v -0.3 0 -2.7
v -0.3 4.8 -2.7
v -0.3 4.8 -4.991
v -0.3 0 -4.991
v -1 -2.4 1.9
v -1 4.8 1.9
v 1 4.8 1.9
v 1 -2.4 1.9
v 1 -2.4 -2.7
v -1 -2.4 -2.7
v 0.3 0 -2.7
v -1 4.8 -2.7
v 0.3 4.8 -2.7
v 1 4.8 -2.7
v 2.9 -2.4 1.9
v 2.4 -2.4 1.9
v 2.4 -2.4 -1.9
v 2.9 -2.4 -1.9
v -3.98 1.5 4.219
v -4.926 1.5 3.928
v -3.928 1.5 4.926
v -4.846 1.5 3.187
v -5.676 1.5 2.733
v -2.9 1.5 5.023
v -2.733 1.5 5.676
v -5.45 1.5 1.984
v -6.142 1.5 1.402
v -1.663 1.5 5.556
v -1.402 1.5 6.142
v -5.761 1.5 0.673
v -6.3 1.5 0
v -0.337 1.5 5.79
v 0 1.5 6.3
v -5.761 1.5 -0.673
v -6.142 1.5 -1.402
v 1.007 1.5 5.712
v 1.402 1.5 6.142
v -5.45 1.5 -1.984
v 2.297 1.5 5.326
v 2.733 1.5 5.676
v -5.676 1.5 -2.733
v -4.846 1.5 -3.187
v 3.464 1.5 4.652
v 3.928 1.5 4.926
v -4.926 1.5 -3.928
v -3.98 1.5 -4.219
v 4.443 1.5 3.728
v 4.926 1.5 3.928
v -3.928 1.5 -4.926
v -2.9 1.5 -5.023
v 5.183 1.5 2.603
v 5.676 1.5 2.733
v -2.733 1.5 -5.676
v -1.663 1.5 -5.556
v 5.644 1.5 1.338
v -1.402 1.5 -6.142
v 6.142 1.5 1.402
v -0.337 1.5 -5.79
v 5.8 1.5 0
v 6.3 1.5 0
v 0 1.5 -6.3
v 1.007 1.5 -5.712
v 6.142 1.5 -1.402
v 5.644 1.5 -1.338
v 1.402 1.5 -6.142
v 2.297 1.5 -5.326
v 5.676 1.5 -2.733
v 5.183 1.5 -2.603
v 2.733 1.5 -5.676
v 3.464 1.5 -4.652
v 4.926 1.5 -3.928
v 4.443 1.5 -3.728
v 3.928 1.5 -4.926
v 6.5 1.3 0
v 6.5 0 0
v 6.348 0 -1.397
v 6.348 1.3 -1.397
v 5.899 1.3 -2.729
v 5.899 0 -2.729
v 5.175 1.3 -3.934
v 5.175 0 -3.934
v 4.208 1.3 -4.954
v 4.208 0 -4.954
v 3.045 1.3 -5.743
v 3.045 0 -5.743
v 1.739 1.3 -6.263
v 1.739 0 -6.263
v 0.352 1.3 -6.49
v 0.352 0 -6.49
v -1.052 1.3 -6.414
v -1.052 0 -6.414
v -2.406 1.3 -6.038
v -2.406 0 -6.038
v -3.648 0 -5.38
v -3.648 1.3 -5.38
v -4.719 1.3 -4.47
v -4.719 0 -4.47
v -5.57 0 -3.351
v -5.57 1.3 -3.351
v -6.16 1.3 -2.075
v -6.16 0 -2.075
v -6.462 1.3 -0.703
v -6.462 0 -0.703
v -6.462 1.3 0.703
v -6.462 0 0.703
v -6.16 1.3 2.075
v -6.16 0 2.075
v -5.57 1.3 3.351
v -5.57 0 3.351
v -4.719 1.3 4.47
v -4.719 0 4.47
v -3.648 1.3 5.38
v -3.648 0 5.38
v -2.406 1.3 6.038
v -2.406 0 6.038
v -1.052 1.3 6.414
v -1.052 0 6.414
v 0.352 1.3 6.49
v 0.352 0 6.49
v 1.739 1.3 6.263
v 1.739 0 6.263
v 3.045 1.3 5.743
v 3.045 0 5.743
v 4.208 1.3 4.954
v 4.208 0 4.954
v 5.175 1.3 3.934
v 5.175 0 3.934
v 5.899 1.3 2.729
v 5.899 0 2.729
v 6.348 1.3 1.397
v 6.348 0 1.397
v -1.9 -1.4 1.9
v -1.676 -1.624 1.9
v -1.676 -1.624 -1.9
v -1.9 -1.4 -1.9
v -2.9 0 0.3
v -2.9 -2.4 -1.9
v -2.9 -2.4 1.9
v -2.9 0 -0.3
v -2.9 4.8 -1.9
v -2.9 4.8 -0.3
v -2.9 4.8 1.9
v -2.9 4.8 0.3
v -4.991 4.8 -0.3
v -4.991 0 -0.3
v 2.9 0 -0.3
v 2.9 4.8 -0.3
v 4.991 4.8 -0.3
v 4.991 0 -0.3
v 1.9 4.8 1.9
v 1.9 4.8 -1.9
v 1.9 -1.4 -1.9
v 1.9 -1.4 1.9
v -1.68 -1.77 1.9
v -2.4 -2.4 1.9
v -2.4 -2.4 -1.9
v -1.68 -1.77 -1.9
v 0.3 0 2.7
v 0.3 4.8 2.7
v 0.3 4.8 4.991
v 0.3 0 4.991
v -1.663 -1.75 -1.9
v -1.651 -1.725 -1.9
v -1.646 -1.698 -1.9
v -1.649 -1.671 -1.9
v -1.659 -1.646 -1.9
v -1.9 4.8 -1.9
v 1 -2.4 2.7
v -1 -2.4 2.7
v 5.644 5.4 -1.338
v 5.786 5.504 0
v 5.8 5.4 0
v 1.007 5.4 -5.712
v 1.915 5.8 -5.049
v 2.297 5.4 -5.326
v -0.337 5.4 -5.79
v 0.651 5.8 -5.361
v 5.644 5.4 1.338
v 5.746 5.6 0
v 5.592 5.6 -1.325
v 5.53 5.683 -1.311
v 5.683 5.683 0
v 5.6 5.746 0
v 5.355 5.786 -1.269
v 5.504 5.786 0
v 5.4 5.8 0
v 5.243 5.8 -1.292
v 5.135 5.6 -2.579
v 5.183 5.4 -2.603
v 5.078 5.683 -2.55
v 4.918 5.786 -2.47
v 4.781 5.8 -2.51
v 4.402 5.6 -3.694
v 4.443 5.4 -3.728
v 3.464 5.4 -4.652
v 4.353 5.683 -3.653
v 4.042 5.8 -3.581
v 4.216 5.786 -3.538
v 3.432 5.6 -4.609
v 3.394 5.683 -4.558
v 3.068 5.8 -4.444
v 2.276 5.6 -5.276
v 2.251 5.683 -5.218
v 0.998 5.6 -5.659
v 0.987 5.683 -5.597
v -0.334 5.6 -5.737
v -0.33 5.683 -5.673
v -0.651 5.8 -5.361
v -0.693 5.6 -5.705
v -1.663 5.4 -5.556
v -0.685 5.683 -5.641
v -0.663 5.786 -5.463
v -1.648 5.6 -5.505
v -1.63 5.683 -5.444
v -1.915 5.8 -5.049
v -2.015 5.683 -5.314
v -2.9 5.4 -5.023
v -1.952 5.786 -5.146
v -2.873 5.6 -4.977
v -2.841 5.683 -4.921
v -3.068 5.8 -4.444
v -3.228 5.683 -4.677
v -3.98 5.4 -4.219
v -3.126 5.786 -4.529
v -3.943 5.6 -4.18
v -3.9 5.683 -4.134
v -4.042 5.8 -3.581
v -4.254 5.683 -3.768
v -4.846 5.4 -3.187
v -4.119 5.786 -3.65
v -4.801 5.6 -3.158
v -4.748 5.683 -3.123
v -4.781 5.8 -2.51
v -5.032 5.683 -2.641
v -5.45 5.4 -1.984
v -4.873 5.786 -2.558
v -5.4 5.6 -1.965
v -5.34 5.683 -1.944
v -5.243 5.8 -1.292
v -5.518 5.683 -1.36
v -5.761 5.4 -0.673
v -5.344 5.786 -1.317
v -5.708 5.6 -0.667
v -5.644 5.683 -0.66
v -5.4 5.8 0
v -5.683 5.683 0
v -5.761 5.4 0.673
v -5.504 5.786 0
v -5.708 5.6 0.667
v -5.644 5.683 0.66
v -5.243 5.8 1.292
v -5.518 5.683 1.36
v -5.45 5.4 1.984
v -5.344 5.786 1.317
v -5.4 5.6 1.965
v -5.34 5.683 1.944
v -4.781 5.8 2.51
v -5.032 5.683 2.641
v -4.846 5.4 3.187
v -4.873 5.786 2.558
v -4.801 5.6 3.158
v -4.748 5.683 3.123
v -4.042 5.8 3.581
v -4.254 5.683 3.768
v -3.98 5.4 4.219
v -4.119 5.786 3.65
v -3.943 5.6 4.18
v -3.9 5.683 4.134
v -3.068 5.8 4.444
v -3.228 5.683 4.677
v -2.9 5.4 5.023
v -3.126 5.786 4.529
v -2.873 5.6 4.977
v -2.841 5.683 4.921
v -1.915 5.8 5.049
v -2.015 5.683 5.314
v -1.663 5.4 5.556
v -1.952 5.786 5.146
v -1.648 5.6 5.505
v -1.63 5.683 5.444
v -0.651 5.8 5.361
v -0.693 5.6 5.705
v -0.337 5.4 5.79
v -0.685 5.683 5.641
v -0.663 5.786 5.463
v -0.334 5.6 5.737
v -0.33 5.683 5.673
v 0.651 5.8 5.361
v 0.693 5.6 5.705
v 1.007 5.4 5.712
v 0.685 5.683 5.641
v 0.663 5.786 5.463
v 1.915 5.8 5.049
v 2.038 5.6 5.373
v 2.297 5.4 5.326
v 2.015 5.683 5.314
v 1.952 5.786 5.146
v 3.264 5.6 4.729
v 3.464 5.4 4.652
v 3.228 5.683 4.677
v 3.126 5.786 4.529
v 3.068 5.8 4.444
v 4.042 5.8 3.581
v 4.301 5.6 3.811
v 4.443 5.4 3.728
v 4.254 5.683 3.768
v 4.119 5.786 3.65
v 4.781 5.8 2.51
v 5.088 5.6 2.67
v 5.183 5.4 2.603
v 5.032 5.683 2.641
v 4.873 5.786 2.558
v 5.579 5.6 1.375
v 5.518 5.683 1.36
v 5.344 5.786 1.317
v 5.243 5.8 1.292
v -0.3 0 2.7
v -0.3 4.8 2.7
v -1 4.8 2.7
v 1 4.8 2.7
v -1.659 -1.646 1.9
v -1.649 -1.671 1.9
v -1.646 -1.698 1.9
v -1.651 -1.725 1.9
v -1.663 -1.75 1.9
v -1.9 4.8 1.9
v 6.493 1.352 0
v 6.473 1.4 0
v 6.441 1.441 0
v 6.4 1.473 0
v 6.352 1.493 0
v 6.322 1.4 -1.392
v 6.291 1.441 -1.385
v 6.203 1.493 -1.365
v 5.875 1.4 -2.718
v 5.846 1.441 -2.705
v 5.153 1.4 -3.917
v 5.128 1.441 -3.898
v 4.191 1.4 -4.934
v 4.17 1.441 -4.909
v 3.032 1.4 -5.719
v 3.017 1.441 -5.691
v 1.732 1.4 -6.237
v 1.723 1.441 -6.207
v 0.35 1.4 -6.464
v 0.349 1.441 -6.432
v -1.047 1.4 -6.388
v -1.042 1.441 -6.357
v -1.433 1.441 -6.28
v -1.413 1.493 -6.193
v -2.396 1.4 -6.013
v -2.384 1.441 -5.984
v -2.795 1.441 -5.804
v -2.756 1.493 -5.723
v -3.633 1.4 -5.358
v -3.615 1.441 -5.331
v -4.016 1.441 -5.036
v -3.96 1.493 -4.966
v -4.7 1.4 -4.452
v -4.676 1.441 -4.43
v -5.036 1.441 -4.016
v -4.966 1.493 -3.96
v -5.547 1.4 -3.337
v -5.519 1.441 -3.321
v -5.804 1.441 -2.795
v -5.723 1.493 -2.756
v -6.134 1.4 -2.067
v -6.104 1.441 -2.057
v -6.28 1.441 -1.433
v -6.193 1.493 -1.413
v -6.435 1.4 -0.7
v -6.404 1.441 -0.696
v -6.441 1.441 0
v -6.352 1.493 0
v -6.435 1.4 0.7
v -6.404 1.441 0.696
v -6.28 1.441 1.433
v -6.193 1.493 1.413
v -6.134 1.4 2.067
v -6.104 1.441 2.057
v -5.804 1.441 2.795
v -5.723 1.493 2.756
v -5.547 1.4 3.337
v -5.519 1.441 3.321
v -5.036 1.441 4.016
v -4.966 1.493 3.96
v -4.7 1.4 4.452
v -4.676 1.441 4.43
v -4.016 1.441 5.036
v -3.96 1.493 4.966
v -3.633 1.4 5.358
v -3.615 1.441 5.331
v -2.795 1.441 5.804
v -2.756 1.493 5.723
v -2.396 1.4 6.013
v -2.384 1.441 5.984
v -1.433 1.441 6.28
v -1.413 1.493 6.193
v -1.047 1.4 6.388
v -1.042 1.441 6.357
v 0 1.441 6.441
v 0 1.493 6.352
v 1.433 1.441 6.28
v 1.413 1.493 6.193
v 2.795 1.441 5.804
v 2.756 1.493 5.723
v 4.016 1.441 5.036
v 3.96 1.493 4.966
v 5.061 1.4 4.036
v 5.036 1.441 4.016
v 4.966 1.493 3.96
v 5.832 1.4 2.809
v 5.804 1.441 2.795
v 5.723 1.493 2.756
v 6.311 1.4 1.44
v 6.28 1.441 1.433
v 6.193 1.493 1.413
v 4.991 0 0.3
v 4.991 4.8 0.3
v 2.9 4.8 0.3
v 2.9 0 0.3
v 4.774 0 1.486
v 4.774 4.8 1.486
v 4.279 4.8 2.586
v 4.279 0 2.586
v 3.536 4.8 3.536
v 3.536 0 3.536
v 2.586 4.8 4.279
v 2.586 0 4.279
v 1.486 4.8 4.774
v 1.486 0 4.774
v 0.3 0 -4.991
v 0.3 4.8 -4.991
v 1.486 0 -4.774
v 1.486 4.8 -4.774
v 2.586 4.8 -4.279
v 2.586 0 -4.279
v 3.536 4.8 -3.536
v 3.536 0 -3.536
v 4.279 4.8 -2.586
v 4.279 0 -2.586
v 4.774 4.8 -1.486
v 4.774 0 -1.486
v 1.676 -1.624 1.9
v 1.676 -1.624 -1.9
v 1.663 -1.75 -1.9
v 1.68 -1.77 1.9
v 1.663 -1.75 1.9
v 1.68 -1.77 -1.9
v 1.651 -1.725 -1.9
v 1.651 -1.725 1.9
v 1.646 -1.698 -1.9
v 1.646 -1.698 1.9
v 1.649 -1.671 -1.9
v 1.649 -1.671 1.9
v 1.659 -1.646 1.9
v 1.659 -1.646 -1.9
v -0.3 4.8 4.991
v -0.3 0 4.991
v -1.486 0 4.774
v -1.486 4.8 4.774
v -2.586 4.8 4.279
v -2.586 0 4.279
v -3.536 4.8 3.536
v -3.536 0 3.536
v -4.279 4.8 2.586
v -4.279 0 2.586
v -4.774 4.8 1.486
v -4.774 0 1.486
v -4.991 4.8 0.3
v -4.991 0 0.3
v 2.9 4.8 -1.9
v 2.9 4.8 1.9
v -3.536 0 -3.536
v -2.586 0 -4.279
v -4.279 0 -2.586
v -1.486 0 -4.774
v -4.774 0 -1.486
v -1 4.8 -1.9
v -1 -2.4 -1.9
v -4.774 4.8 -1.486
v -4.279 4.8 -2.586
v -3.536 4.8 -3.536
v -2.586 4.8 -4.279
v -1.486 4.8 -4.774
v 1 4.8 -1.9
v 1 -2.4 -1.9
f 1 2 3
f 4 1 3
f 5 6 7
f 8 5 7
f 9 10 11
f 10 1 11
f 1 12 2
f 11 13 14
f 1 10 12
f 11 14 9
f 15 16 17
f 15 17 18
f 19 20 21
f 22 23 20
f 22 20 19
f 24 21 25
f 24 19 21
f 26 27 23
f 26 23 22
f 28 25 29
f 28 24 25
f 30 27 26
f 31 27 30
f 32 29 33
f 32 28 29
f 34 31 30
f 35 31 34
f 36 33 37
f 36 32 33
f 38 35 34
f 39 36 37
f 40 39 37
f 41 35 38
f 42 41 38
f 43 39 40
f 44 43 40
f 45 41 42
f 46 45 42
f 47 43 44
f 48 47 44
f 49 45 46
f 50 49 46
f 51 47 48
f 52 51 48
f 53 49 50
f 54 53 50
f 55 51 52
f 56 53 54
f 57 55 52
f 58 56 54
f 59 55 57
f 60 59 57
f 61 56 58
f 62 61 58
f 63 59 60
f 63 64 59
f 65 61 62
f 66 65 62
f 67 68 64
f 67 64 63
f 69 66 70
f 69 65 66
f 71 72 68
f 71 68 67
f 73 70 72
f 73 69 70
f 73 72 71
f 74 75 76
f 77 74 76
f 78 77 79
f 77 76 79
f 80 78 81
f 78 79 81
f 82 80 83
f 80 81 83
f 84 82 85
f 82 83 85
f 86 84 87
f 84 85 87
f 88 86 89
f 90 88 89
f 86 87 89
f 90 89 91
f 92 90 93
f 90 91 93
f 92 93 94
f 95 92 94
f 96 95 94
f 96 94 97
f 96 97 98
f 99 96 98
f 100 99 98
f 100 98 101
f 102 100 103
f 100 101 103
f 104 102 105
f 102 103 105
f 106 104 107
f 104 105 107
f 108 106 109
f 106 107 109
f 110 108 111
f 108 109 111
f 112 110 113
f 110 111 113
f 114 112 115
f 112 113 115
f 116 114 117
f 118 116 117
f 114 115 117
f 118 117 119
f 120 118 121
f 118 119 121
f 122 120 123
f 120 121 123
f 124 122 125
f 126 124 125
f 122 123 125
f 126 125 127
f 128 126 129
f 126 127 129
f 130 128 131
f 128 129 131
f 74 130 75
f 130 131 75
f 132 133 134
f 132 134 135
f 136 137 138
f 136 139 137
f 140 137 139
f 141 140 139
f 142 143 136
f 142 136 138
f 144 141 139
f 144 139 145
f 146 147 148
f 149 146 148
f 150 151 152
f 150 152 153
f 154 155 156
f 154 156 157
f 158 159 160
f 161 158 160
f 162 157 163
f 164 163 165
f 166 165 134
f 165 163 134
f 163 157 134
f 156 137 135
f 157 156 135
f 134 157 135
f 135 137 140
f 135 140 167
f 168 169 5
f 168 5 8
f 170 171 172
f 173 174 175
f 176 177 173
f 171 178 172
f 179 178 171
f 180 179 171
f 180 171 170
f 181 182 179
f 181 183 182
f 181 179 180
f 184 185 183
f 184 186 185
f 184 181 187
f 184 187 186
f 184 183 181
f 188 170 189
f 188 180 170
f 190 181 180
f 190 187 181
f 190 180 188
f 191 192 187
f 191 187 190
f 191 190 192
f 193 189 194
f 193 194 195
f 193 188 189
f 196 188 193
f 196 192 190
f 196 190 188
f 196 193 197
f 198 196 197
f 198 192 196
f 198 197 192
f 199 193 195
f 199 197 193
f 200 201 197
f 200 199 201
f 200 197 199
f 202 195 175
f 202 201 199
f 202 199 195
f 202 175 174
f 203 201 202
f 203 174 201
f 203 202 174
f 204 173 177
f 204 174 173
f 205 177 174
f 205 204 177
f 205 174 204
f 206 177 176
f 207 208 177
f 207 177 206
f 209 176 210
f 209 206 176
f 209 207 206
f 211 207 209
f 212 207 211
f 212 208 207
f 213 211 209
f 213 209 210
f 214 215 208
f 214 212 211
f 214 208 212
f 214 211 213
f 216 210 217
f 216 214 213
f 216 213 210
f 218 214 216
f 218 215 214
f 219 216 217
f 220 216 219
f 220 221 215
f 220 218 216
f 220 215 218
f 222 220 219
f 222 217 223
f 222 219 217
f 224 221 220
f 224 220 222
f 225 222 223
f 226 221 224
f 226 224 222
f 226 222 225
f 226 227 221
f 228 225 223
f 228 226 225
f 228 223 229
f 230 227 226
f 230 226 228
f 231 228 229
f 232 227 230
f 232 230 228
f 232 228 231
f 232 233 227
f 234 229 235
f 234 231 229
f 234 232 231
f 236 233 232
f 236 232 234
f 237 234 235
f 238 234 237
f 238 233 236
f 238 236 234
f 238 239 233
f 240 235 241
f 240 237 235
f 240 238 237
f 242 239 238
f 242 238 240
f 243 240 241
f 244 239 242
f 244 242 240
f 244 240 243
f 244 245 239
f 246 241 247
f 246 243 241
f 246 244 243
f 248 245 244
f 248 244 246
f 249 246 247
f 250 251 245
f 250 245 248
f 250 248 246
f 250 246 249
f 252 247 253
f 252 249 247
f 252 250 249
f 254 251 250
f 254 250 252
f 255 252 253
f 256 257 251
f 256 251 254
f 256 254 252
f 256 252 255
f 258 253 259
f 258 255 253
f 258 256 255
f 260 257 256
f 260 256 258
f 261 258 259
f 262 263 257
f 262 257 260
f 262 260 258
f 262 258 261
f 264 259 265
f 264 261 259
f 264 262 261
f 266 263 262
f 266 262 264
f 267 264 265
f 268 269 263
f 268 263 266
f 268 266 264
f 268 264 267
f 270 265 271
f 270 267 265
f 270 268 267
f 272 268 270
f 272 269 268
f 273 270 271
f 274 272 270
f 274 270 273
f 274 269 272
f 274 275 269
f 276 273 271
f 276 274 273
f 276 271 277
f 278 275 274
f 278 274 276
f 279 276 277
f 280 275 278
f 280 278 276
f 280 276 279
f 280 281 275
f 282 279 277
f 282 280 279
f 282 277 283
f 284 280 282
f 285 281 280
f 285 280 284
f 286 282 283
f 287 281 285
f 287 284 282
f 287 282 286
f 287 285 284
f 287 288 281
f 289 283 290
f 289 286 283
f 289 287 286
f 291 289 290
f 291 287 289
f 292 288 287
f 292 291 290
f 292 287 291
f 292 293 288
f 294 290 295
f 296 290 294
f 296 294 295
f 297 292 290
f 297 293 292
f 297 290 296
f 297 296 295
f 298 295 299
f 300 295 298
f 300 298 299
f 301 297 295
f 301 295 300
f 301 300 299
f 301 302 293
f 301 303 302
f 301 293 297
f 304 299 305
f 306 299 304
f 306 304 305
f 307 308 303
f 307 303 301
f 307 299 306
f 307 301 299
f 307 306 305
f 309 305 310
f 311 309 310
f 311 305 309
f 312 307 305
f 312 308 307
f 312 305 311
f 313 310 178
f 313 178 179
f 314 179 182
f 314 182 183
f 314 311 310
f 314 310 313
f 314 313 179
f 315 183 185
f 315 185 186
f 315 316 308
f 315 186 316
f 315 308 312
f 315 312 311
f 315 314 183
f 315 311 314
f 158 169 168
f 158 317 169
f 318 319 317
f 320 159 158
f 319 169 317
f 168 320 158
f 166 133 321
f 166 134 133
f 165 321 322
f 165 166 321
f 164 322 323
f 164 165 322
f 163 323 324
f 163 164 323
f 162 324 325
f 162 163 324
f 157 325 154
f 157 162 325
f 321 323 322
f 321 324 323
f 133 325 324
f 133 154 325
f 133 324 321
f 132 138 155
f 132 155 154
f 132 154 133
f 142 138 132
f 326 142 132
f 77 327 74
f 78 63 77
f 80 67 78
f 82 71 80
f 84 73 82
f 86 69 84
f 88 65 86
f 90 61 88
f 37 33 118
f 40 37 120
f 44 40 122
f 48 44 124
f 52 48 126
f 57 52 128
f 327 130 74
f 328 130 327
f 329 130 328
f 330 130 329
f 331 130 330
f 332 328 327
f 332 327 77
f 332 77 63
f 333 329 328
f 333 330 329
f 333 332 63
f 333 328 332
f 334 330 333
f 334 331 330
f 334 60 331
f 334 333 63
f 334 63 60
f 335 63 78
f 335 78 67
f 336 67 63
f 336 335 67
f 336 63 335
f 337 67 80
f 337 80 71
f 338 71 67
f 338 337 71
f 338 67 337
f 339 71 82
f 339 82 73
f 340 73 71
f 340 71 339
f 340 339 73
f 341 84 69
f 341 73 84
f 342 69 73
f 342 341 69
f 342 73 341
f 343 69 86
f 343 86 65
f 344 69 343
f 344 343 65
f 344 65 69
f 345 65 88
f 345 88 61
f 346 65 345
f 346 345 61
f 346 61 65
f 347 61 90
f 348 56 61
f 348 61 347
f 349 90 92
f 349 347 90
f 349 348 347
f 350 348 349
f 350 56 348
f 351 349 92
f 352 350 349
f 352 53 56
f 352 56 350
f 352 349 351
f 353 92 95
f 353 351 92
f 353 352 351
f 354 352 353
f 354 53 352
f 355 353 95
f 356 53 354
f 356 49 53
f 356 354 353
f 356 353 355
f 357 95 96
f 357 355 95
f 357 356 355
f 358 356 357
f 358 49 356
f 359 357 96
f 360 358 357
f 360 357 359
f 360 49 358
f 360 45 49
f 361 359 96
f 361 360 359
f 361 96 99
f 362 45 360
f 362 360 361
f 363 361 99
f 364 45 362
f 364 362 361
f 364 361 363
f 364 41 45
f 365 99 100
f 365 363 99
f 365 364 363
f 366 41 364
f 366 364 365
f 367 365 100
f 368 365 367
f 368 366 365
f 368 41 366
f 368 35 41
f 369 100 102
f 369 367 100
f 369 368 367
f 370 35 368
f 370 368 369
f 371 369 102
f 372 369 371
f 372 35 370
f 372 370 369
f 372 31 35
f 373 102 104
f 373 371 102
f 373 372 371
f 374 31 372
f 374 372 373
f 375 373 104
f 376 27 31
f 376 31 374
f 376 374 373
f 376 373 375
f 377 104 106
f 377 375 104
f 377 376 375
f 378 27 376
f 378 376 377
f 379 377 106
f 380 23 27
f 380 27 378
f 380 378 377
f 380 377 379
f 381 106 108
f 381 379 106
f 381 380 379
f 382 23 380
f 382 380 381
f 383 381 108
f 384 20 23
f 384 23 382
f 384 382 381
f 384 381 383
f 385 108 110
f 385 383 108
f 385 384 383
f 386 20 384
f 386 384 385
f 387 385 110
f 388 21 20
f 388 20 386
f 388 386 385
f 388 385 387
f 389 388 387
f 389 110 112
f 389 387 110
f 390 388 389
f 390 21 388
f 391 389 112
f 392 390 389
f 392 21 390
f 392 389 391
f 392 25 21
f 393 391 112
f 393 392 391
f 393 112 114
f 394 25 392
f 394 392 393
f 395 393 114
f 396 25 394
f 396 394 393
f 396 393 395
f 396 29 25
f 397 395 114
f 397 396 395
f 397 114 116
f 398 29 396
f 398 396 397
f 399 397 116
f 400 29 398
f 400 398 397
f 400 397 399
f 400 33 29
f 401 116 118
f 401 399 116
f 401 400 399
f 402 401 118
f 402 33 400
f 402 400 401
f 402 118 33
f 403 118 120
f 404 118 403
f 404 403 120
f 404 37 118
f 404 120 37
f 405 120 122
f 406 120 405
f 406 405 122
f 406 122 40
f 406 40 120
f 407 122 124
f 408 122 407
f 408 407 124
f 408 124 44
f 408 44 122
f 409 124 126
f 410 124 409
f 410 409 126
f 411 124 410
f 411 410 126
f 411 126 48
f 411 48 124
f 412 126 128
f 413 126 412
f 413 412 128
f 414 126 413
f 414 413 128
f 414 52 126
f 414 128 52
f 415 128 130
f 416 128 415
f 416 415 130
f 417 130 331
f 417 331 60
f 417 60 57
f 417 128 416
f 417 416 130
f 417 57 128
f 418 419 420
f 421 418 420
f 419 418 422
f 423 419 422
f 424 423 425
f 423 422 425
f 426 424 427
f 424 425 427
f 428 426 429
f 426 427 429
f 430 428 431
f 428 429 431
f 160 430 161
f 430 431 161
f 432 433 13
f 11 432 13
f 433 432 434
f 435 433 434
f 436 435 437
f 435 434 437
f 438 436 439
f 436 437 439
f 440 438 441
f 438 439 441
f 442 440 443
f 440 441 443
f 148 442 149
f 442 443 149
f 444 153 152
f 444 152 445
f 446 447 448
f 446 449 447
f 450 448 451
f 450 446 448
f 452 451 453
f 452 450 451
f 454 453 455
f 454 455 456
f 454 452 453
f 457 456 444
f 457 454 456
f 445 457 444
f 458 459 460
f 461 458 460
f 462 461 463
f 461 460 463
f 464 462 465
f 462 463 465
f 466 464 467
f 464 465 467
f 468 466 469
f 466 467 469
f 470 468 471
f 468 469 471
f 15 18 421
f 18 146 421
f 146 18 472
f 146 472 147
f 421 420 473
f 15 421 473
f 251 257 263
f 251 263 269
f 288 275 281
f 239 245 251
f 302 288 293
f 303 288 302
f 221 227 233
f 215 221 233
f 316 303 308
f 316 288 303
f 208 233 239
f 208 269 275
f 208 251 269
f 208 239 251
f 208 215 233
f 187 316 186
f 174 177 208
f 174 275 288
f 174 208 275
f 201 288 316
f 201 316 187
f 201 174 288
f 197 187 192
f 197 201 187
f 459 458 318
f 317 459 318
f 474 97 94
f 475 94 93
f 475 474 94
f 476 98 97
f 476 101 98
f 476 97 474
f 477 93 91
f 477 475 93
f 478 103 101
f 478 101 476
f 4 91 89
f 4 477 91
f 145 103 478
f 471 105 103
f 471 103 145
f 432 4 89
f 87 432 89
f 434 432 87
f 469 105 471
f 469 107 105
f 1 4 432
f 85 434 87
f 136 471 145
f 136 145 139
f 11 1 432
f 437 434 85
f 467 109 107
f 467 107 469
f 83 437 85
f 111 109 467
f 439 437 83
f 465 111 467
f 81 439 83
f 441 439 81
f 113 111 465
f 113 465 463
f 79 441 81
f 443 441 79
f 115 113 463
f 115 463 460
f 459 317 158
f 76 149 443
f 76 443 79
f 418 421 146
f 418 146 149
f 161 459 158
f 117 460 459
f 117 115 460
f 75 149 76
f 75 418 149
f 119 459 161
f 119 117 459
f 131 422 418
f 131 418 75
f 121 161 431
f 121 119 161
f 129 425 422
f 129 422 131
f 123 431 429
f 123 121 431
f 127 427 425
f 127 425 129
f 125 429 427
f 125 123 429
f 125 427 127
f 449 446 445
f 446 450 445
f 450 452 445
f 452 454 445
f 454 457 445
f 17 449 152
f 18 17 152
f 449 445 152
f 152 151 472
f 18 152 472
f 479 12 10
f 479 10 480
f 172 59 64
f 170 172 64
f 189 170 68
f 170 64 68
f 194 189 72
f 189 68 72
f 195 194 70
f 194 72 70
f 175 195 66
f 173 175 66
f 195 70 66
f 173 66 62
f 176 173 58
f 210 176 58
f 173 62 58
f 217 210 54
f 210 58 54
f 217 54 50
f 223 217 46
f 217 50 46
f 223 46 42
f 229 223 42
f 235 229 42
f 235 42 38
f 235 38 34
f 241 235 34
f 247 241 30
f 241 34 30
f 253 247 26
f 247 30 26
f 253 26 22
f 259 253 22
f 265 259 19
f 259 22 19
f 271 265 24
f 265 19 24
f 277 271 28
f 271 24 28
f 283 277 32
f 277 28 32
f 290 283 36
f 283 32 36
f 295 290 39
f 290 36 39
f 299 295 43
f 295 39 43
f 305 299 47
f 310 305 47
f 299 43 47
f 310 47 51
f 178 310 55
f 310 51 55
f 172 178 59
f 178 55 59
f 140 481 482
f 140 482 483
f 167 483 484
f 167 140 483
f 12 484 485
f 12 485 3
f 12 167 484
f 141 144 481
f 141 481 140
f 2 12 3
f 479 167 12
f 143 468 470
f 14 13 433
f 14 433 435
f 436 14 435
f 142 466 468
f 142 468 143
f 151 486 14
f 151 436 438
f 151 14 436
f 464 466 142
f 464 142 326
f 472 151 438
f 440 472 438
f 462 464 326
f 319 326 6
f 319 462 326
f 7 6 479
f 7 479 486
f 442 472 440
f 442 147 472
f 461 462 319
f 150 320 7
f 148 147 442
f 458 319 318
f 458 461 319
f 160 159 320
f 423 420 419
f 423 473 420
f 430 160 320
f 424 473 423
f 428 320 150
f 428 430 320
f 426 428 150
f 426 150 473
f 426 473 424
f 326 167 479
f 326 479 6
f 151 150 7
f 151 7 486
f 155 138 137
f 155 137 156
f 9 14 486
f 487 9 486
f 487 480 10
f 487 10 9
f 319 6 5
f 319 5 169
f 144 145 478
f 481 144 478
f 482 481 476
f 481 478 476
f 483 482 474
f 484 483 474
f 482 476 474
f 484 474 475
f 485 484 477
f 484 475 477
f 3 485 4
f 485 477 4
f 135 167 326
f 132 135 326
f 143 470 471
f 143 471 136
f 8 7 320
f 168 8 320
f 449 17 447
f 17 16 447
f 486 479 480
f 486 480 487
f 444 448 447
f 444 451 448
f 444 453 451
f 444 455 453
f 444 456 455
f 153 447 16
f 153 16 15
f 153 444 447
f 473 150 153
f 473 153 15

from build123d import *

# Parameters (mm, degrees)
SKETCH1_R           = 6.5
BOSS_EXTRUDE1_DEPTH = 1.5
SKETCH2_R           = 5.8
BOSS_EXTRUDE2_DEPTH = 4.3
FILLET1_R           = 0.4
SKETCH3_R           = 5
CUT_EXTRUDE1_DEPTH  = 4.8
BOSS_EXTRUDE3_DEPTH = 4.8
SKETCH5_W           = 2
SKETCH5_H           = 0.8
SKETCH5_W_2         = 1
SKETCH5_H_2         = 3.8
BOSS_EXTRUDE4_DEPTH = 7.2
CUT_EXTRUDE2_REACH  = 10.4
BOSS_EXTRUDE5_DEPTH = 3.8
FILLET2_R           = 0.1
FILLET3_R           = 0.2


with BuildPart() as part:
    # Sketch1 → Boss-Extrude1 (new body)
    with BuildSketch(Plane(origin=(0, 0, 0), x_dir=(1, 0, 0), z_dir=(0, 1, 0))):
        Circle(SKETCH1_R)
    extrude(amount=BOSS_EXTRUDE1_DEPTH)

    # Sketch2 → Boss-Extrude2 (add)
    with BuildSketch(Plane(origin=(0, 1.5, 0), x_dir=(1, 0, 0), z_dir=(0, 1, 0))):
        Circle(SKETCH2_R)
    extrude(amount=BOSS_EXTRUDE2_DEPTH)

    # Fillet1
    fillet1_edges = [part.edges().sort_by_distance(p)[0] for p in [
        (-5.8, 5.8, 0),
    ]]
    fillet(fillet1_edges, radius=FILLET1_R)

    # Sketch3 → Cut-Extrude1 (cut)
    with BuildSketch(Plane.XZ):
        Circle(SKETCH3_R)
    extrude(amount=-CUT_EXTRUDE1_DEPTH, mode=Mode.SUBTRACT)

    # Sketch4 → Boss-Extrude3 (add)
    with BuildSketch(Plane.XZ.offset(-4.8)):
        with BuildLine():
            Line((-4.990991885, 0.3), (-2.9, 0.3))
            Line((-2.9, 0.3), (-2.9, -0.3))
            Line((-2.9, -0.3), (-4.990991885, -0.3))
            ThreePointArc((-4.990991885, -0.3), (-5, 0), (-4.990991885, 0.3))
        make_face()
        with BuildLine():
            Line((2.9, 0.3), (2.9, -0.3))
            Line((2.9, -0.3), (4.990991885, -0.3))
            ThreePointArc((4.990991885, -0.3), (5, 0), (4.990991885, 0.3))
            Line((4.990991885, 0.3), (2.9, 0.3))
        make_face()
        with BuildLine():
            Line((-0.3, 4.990991885), (-0.3, 2.7))
            Line((-0.3, 2.7), (0.3, 2.7))
            Line((0.3, 2.7), (0.3, 4.990991885))
            ThreePointArc((0.3, 4.990991885), (0, 5), (-0.3, 4.990991885))
        make_face()
        with BuildLine():
            Line((0.3, -2.7), (-0.3, -2.7))
            Line((-0.3, -2.7), (-0.3, -4.990991885))
            ThreePointArc((-0.3, -4.990991885), (0, -5), (0.3, -4.990991885))
            Line((0.3, -4.990991885), (0.3, -2.7))
        make_face()
    extrude(amount=BOSS_EXTRUDE3_DEPTH)

    # Sketch5 → Boss-Extrude4 (add)
    with BuildSketch(Plane.XZ.offset(-4.8)):
        with Locations((0, 2.3)):
            Rectangle(SKETCH5_W, SKETCH5_H)
        with Locations((-2.4, 0)):
            Rectangle(SKETCH5_W_2, SKETCH5_H_2)
        with Locations((2.4, 0)):
            Rectangle(SKETCH5_W_2, SKETCH5_H_2)
        with Locations((0, -2.3)):
            Rectangle(SKETCH5_W, SKETCH5_H)
    extrude(amount=BOSS_EXTRUDE4_DEPTH)

    # Sketch6 → Cut-Extrude2 (cut, up to next)
    with BuildSketch(Plane.XY.offset(1.9), mode=Mode.PRIVATE) as cut_extrude2_sk1:
        Polygon((-1.9, -2.4), (-1.9, -1.9625), (-2.4, -2.4), align=None)
    cut_extrude2_tool1 = extrude(cut_extrude2_sk1.sketch, amount=-CUT_EXTRUDE2_REACH, mode=Mode.PRIVATE) & part.part
    add(cut_extrude2_tool1.solids().sort_by_distance((-2.066667, -2.254167, 1.9))[0], mode=Mode.SUBTRACT)
    # Sketch6 → Cut-Extrude2 (cut, up to next)
    with BuildSketch(Plane.XY.offset(1.9), mode=Mode.PRIVATE) as cut_extrude2_sk2:
        Polygon((1.9, -1.9625), (1.9, -2.4), (2.4, -2.4), align=None)
    cut_extrude2_tool2 = extrude(cut_extrude2_sk2.sketch, amount=-CUT_EXTRUDE2_REACH, mode=Mode.PRIVATE) & part.part
    add(cut_extrude2_tool2.solids().sort_by_distance((2.066667, -2.254167, 1.9))[0], mode=Mode.SUBTRACT)

    # Sketch6<3> → Boss-Extrude5 (add)
    with BuildSketch(Plane.XY.offset(1.9)):
        Polygon((-1.6, -1.7), (-1.9, -1.4), (-1.9, -1.9625), align=None)
        Polygon((1.6, -1.7), (1.9, -1.9625), (1.9, -1.4), align=None)
    extrude(amount=-BOSS_EXTRUDE5_DEPTH)

    # Fillet2
    fillet2_edges = [part.edges().sort_by_distance(p)[0] for p in [
        (-1.6, -1.7, 0),
        (1.6, -1.7, 0),
    ]]
    fillet(fillet2_edges, radius=FILLET2_R)

    # Fillet3
    fillet3_edges = [part.edges().sort_by_distance(p)[0] for p in [
        (-6.5, 1.5, 0),
    ]]
    fillet(fillet3_edges, radius=FILLET3_R)


solid = part.part
